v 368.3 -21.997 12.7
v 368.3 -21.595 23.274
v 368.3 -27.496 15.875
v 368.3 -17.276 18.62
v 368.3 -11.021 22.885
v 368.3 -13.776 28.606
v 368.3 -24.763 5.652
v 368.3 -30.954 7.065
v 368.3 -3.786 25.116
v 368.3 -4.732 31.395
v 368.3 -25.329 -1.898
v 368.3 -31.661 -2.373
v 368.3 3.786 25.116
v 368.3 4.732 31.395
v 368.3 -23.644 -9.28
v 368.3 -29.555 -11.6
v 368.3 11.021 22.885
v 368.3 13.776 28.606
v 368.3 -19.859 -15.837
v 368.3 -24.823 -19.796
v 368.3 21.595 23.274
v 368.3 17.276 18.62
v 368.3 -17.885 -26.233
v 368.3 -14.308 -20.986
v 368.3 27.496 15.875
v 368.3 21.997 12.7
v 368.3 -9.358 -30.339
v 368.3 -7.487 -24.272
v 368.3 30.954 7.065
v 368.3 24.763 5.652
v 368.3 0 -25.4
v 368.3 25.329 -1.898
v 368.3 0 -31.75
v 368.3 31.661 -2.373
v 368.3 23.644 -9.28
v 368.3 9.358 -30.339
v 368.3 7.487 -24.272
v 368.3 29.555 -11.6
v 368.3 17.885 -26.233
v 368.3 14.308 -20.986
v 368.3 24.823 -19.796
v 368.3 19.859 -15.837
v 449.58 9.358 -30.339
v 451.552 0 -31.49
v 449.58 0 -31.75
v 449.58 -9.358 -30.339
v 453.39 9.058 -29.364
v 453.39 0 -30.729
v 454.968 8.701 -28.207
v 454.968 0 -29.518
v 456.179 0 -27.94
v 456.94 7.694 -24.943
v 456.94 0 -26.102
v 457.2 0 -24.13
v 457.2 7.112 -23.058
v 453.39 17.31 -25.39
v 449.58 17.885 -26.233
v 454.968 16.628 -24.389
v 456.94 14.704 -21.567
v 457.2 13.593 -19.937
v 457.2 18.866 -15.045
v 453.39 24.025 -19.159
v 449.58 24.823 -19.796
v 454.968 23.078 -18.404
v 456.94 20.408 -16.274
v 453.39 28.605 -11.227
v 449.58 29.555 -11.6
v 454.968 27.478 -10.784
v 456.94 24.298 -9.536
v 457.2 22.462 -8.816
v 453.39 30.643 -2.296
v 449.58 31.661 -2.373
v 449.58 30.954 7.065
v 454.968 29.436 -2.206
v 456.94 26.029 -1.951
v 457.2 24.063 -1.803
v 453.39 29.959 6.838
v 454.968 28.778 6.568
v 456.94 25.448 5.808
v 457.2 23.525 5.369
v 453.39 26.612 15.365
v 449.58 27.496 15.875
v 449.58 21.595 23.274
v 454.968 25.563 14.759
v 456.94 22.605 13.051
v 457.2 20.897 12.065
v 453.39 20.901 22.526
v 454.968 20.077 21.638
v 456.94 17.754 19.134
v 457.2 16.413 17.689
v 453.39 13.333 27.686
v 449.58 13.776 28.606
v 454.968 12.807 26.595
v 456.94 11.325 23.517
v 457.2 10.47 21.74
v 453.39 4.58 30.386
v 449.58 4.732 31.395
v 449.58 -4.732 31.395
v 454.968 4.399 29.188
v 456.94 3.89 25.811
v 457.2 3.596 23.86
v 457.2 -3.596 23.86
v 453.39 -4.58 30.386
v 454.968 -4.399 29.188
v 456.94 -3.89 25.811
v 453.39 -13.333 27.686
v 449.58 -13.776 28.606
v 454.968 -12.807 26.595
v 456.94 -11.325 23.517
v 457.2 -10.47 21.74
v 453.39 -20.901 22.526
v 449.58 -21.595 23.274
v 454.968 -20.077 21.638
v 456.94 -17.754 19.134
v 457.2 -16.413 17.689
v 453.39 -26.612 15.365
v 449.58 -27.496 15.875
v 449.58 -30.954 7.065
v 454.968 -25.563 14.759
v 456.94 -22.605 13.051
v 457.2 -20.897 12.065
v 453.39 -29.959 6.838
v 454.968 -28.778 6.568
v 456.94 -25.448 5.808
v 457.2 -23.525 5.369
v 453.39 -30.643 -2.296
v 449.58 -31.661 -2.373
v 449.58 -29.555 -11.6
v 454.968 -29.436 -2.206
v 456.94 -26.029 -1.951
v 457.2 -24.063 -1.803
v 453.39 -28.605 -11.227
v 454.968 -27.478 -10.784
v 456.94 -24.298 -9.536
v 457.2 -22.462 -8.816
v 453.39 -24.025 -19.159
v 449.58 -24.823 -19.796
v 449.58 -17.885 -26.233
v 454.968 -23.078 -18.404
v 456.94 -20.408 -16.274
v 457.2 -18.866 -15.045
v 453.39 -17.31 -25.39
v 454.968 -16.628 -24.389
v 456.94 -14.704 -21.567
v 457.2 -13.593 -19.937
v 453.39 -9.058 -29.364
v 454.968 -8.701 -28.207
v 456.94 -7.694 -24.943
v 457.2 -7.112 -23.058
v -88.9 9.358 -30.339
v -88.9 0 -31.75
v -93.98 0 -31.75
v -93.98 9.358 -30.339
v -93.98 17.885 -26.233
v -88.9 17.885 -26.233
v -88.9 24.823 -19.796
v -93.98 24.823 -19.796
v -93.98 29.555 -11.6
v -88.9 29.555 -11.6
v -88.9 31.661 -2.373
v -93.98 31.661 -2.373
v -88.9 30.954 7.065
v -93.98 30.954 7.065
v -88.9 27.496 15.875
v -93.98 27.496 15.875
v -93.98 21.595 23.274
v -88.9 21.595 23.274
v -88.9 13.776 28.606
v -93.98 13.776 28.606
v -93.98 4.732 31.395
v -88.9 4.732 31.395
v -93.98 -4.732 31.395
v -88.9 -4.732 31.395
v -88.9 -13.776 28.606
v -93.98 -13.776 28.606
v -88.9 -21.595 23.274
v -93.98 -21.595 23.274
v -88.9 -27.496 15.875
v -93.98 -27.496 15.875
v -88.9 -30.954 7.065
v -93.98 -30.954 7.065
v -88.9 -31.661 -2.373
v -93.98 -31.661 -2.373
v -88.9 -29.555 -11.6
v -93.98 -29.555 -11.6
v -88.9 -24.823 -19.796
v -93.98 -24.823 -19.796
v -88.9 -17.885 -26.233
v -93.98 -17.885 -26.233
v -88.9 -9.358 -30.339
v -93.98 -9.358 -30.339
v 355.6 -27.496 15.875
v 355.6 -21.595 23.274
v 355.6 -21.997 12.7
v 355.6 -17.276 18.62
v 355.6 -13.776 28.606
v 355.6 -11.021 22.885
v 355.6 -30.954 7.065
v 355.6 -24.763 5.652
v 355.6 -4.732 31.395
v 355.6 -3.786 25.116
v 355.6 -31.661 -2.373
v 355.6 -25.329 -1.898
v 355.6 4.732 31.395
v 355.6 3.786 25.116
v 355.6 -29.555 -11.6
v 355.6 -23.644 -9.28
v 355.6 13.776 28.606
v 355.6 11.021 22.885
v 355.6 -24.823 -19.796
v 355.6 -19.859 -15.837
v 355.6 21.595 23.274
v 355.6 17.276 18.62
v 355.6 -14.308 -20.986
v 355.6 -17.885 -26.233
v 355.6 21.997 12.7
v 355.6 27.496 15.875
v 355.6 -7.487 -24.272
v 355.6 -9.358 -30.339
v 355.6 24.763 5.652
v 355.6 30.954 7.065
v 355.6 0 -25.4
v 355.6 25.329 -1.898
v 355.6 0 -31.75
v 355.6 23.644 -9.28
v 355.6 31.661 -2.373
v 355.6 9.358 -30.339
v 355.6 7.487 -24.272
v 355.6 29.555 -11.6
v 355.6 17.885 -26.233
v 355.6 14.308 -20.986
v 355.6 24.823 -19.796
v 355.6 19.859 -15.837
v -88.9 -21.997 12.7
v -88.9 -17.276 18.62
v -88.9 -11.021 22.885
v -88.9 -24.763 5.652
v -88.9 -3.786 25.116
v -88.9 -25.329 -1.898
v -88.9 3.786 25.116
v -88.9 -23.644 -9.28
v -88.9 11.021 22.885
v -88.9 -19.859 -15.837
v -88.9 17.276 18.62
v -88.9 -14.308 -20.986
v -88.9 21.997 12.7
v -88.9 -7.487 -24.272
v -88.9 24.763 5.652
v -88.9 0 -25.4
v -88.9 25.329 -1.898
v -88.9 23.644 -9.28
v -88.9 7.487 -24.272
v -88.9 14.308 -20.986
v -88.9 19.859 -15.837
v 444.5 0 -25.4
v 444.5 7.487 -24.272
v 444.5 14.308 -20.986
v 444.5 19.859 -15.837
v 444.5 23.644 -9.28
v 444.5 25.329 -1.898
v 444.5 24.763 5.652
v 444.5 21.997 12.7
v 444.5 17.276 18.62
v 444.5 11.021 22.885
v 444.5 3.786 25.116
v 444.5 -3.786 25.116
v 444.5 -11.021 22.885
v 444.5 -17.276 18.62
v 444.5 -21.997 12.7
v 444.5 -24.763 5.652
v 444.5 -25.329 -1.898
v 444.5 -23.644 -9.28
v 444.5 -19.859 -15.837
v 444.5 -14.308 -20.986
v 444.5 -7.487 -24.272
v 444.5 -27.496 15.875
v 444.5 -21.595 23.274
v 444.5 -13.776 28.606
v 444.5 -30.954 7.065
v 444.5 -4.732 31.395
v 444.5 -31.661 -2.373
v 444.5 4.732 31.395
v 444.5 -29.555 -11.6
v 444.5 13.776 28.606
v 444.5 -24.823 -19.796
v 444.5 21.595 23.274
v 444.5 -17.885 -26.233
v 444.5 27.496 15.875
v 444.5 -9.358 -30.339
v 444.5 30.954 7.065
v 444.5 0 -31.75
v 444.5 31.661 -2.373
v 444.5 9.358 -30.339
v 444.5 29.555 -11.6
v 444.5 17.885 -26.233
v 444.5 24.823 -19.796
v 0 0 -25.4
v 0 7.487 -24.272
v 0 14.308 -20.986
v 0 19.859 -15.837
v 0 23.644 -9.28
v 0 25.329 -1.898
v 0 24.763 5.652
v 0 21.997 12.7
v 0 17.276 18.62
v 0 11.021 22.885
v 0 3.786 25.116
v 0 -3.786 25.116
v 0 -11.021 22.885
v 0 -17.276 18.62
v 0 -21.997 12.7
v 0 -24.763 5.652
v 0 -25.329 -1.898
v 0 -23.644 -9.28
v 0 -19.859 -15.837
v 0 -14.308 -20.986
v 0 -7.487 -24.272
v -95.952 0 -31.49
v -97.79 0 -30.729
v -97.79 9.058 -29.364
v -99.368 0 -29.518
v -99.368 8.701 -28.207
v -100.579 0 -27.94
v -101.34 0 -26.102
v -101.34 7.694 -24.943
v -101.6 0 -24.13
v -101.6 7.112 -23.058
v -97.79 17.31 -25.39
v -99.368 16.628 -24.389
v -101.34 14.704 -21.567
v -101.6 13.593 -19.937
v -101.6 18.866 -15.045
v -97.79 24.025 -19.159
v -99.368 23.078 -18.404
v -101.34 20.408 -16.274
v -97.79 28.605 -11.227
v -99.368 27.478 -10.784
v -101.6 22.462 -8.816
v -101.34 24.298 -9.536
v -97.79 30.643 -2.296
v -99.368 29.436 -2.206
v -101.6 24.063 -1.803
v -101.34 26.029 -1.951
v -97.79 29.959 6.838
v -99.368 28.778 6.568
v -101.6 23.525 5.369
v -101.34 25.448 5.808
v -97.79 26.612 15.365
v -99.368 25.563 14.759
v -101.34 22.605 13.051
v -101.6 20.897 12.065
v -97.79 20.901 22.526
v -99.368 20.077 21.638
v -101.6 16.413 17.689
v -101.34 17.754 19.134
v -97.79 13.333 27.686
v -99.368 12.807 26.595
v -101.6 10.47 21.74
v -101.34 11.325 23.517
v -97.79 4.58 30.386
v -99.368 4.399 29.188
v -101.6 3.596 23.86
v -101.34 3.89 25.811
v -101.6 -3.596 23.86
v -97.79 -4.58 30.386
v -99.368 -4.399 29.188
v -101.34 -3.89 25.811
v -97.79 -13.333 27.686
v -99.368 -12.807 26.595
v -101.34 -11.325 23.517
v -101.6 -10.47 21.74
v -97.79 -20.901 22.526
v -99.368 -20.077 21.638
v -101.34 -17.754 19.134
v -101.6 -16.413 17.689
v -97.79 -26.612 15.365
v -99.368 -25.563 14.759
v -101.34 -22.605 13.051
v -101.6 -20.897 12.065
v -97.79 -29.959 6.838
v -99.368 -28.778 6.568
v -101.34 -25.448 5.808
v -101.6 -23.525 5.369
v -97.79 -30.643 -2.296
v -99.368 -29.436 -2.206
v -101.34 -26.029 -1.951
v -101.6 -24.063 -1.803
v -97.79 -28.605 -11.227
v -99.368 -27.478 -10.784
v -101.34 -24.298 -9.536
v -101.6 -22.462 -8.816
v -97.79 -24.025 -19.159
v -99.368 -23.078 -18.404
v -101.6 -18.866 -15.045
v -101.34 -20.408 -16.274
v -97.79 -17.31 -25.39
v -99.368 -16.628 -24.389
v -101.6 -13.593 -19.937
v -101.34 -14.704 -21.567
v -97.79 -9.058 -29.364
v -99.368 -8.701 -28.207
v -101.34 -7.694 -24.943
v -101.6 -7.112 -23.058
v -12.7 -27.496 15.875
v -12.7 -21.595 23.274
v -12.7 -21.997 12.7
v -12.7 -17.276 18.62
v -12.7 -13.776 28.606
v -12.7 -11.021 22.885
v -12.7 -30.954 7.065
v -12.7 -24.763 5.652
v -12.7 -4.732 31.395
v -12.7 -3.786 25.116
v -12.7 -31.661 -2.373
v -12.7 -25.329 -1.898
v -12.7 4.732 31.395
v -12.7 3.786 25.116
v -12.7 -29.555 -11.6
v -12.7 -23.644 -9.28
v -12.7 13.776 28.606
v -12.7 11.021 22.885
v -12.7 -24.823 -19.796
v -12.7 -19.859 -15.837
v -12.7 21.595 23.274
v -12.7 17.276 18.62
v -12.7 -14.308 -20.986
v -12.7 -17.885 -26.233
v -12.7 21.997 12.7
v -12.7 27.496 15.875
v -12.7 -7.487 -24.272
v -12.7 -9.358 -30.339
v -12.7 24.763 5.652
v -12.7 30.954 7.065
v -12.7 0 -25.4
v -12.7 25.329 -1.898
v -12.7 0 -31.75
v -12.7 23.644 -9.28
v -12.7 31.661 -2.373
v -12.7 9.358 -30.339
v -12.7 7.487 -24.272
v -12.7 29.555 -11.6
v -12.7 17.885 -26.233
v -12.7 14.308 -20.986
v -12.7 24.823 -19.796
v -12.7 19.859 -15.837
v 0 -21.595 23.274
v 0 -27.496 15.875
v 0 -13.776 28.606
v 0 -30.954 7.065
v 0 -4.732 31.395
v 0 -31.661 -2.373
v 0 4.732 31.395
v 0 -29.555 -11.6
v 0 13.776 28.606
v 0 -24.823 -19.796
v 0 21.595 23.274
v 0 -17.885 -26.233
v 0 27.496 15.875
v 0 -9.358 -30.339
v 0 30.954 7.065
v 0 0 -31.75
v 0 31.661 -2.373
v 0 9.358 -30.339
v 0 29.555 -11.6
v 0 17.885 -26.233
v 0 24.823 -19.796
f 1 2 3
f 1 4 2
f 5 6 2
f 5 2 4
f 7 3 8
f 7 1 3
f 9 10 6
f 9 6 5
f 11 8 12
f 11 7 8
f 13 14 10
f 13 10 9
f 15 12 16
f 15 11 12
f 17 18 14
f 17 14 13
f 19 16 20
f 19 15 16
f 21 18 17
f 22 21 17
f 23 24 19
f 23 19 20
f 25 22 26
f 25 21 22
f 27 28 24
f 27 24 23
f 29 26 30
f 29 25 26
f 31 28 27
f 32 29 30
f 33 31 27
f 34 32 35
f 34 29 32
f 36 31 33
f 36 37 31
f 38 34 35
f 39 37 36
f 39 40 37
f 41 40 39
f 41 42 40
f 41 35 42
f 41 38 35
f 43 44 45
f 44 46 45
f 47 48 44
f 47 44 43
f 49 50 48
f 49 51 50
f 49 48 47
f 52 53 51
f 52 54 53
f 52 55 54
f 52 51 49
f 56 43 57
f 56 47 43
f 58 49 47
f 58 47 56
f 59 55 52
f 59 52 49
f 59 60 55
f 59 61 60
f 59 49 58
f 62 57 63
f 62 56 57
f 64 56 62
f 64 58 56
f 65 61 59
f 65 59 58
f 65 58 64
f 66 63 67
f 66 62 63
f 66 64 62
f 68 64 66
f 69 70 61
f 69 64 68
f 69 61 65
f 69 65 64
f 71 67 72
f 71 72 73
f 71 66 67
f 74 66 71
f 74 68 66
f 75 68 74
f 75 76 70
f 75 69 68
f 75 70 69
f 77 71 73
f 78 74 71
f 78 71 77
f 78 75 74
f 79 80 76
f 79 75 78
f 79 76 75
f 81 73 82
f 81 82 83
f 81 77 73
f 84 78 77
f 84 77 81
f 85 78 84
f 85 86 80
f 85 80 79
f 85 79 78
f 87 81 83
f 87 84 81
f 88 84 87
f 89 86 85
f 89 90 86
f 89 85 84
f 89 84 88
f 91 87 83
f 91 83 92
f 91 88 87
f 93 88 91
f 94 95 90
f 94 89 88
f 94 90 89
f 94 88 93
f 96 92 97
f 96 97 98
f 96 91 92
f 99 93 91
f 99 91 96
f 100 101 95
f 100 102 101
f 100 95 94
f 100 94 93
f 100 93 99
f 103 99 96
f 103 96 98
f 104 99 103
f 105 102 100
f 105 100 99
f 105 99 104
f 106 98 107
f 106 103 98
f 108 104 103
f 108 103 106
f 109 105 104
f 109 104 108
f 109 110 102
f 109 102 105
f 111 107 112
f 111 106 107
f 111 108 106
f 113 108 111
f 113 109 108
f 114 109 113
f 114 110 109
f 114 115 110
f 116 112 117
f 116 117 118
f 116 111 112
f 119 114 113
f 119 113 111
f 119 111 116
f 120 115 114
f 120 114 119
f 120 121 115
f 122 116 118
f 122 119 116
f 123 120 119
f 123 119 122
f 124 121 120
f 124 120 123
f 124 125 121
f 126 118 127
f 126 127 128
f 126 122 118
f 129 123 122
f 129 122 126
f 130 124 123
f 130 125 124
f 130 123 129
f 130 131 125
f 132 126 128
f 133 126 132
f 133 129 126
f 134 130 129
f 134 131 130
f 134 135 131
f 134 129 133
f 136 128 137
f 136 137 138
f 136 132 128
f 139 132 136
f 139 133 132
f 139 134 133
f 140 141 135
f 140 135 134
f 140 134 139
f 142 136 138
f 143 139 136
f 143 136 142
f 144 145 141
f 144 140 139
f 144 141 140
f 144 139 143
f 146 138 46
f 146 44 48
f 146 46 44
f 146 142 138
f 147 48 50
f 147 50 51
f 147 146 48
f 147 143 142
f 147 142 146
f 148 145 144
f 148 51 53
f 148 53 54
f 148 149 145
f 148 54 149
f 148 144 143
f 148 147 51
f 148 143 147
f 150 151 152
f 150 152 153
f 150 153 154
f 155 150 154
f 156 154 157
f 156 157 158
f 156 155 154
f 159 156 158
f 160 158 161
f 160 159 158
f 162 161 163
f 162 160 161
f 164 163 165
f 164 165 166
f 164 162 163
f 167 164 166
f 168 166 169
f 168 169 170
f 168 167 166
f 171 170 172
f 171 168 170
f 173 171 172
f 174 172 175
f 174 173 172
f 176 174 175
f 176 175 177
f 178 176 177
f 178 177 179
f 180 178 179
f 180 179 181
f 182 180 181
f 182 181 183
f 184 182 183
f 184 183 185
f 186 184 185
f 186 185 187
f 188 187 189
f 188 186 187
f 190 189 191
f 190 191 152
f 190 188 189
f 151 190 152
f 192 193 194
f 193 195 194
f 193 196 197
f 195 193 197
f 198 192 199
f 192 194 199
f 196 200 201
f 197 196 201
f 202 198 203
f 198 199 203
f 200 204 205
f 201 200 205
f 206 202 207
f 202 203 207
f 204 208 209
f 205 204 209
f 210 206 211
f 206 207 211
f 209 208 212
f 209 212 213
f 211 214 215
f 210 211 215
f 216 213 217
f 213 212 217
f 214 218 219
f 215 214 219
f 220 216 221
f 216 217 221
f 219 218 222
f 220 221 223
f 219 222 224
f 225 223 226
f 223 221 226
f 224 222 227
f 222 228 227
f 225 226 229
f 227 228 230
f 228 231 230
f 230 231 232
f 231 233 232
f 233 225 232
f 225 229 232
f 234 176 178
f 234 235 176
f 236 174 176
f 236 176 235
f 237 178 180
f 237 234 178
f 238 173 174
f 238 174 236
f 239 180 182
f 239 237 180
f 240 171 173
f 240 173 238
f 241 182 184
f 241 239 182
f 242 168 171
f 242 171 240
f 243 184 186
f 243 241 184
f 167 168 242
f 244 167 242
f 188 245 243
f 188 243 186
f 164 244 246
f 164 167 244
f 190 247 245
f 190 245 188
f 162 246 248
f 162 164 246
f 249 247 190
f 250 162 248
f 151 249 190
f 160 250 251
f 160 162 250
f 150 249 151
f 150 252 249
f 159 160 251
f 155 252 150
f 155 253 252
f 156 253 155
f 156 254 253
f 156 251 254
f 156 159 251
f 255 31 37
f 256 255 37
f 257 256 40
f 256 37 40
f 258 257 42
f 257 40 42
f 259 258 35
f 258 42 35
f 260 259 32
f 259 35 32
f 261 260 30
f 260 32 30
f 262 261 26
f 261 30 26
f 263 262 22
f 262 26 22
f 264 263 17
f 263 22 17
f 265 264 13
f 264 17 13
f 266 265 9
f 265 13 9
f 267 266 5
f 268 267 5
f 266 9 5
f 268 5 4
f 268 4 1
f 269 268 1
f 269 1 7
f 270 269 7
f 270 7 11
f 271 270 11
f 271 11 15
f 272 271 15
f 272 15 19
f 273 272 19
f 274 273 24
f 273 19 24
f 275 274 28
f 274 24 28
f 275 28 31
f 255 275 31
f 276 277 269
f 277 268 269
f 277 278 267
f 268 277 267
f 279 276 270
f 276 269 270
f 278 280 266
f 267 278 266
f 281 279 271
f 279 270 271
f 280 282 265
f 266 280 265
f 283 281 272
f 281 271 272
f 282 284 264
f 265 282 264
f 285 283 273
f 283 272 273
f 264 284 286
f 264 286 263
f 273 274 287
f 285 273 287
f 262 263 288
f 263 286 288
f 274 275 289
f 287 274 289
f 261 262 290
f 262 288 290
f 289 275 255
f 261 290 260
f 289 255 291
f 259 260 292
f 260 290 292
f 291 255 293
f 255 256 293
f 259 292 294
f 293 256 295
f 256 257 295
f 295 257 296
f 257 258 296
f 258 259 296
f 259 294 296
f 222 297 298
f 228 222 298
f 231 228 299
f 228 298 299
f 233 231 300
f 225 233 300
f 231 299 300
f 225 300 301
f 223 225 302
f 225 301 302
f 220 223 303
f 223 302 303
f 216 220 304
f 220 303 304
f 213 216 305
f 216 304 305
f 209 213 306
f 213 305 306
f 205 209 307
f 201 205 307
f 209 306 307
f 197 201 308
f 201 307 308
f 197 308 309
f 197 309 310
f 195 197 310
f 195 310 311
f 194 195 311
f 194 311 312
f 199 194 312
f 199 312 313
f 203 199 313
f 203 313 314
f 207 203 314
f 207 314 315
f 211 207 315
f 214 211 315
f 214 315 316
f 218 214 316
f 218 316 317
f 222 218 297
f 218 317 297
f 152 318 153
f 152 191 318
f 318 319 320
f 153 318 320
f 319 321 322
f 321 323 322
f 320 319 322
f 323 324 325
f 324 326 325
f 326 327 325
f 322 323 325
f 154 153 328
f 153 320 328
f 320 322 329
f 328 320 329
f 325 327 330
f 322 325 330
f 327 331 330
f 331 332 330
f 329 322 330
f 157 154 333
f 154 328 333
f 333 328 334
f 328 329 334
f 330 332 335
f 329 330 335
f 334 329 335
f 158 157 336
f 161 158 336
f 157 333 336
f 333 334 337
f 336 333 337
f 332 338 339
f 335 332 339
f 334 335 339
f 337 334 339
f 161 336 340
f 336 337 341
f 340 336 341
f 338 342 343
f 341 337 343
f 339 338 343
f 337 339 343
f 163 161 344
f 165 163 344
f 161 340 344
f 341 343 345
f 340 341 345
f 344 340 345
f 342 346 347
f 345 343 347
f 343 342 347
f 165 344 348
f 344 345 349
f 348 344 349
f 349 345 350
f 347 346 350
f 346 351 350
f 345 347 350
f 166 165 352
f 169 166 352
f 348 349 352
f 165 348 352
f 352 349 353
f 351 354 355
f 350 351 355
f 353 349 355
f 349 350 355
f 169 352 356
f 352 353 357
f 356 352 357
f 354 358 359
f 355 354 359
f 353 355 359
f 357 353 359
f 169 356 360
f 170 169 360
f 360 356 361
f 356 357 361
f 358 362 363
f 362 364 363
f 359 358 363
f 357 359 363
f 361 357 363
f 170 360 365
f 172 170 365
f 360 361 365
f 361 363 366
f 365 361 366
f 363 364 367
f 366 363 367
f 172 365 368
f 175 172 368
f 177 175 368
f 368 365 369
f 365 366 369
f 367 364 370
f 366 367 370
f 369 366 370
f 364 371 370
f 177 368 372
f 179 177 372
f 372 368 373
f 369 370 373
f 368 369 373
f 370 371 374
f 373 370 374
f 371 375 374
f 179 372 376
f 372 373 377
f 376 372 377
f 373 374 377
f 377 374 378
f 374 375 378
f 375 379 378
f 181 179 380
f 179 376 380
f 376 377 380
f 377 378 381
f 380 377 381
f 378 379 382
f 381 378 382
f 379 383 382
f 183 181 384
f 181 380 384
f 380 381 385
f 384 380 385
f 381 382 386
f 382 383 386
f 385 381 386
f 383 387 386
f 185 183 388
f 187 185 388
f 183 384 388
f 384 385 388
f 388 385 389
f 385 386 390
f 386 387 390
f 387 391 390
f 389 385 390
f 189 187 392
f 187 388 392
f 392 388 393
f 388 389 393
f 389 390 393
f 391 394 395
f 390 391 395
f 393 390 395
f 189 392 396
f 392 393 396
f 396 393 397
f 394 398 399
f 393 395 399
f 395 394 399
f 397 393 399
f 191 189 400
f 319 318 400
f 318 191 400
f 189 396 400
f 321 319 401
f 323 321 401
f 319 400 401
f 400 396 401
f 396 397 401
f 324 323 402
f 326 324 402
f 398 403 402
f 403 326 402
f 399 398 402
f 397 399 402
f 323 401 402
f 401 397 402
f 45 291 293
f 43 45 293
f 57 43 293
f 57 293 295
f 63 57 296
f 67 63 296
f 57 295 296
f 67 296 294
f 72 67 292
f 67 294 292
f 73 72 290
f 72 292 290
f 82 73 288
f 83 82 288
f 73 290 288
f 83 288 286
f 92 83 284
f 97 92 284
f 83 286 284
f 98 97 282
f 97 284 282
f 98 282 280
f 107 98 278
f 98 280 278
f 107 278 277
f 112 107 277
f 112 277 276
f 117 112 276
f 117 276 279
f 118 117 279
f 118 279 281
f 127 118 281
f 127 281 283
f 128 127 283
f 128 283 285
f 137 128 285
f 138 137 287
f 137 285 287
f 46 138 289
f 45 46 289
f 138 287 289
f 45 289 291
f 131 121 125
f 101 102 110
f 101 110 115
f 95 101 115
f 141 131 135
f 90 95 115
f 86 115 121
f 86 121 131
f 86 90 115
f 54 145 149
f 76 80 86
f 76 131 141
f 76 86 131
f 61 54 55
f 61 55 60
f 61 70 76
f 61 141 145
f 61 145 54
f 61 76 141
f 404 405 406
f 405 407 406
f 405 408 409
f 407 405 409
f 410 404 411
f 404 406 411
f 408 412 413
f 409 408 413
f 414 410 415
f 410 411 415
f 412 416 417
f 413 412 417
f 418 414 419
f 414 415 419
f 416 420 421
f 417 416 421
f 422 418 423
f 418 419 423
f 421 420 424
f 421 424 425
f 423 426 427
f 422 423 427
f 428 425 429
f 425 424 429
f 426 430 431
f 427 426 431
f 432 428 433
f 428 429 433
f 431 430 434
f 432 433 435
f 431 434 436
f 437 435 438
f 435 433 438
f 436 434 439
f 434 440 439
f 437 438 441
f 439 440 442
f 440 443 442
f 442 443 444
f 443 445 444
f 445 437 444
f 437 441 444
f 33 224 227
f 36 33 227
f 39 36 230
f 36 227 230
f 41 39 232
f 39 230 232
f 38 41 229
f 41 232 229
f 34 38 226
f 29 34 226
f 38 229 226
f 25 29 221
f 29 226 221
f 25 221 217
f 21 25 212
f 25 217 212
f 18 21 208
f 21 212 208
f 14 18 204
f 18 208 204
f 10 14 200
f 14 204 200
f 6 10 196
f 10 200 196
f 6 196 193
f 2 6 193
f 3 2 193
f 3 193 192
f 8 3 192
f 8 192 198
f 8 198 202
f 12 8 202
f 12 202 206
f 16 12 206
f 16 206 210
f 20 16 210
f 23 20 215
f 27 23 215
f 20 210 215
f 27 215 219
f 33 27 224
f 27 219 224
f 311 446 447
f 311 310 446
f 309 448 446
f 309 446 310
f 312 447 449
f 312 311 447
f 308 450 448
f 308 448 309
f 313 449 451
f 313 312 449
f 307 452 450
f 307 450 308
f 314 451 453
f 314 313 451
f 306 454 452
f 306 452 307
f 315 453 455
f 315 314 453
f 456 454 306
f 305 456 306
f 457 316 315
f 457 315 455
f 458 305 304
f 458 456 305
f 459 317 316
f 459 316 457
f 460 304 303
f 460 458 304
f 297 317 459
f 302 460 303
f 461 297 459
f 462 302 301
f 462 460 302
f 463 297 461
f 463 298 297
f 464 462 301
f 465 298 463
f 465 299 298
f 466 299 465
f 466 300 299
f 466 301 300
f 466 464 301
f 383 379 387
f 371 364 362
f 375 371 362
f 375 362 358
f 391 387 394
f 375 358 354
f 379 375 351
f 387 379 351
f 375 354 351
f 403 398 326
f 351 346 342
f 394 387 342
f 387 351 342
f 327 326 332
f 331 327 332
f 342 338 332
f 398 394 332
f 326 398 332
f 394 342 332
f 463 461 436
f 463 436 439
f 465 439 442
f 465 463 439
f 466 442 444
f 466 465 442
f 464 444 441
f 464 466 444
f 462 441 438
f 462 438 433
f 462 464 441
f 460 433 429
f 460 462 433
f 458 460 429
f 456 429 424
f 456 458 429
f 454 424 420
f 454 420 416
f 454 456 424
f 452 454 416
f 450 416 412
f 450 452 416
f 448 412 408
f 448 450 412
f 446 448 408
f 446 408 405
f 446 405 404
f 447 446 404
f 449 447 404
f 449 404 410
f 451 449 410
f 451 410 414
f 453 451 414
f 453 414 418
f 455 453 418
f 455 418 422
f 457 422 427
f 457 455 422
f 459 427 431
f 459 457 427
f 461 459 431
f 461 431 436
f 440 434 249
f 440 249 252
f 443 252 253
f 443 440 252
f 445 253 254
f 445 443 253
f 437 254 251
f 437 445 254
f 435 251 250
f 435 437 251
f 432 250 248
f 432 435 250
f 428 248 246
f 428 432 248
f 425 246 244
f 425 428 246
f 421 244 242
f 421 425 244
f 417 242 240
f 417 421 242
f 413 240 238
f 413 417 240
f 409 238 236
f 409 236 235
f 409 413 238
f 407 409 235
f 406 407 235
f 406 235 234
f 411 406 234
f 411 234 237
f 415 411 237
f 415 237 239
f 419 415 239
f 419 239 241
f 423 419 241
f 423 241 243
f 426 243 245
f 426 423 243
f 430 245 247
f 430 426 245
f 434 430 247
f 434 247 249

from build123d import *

# Parameters (mm, degrees)
SKETCH1_R           = 25.4
BOSS_EXTRUDE1_DEPTH = 355.6
SKETCH2_R           = 31.75
BOSS_EXTRUDE2_DEPTH = 12.7
SKETCH3_R           = 25.4
BOSS_EXTRUDE3_DEPTH = 76.2
SKETCH4_R           = 31.75
BOSS_EXTRUDE4_DEPTH = 12.7
FILLET1_R           = 7.62
FILLET2_R           = 7.62


with BuildPart() as part:
    # Sketch1 → Boss-Extrude1 (new body)
    with BuildSketch(Plane(origin=(0, 0, 0), x_dir=(0, 0, -1), z_dir=(1, 0, 0))):
        Circle(SKETCH1_R)
    extrude(amount=BOSS_EXTRUDE1_DEPTH)

    # Sketch2 → Boss-Extrude2 (add)
    with BuildSketch(Plane(origin=(355.6, 0, 0), x_dir=(0, 0, -1), z_dir=(1, 0, 0))):
        Circle(SKETCH2_R)
    boss_extrude2 = extrude(amount=BOSS_EXTRUDE2_DEPTH)

    # Sketch3 → Boss-Extrude3 (add)
    with BuildSketch(Plane(origin=(368.3, 0, 0), x_dir=(0, 0, -1), z_dir=(1, 0, 0))):
        Circle(SKETCH3_R)
    boss_extrude3 = extrude(amount=BOSS_EXTRUDE3_DEPTH)

    # Sketch4 → Boss-Extrude4 (add)
    with BuildSketch(Plane(origin=(444.5, 0, 0), x_dir=(0, 0, -1), z_dir=(1, 0, 0))):
        Circle(SKETCH4_R)
    boss_extrude4 = extrude(amount=BOSS_EXTRUDE4_DEPTH)

    # Mirror1: Boss-Extrude2, Boss-Extrude3, Boss-Extrude4 across plane
    add(boss_extrude2.mirror(Plane.ZY.offset(-177.8)))
    add(boss_extrude3.mirror(Plane.ZY.offset(-177.8)))
    add(boss_extrude4.mirror(Plane.ZY.offset(-177.8)))

    # Fillet1
    fillet1_edges = [part.edges().sort_by_distance(p)[0] for p in [
        (457.2, 0, 31.75),
    ]]
    fillet(fillet1_edges, radius=FILLET1_R)

    # Fillet2
    fillet2_edges = [part.edges().sort_by_distance(p)[0] for p in [
        (-101.6, 0, 31.75),
    ]]
    fillet(fillet2_edges, radius=FILLET2_R)


solid = part.part
